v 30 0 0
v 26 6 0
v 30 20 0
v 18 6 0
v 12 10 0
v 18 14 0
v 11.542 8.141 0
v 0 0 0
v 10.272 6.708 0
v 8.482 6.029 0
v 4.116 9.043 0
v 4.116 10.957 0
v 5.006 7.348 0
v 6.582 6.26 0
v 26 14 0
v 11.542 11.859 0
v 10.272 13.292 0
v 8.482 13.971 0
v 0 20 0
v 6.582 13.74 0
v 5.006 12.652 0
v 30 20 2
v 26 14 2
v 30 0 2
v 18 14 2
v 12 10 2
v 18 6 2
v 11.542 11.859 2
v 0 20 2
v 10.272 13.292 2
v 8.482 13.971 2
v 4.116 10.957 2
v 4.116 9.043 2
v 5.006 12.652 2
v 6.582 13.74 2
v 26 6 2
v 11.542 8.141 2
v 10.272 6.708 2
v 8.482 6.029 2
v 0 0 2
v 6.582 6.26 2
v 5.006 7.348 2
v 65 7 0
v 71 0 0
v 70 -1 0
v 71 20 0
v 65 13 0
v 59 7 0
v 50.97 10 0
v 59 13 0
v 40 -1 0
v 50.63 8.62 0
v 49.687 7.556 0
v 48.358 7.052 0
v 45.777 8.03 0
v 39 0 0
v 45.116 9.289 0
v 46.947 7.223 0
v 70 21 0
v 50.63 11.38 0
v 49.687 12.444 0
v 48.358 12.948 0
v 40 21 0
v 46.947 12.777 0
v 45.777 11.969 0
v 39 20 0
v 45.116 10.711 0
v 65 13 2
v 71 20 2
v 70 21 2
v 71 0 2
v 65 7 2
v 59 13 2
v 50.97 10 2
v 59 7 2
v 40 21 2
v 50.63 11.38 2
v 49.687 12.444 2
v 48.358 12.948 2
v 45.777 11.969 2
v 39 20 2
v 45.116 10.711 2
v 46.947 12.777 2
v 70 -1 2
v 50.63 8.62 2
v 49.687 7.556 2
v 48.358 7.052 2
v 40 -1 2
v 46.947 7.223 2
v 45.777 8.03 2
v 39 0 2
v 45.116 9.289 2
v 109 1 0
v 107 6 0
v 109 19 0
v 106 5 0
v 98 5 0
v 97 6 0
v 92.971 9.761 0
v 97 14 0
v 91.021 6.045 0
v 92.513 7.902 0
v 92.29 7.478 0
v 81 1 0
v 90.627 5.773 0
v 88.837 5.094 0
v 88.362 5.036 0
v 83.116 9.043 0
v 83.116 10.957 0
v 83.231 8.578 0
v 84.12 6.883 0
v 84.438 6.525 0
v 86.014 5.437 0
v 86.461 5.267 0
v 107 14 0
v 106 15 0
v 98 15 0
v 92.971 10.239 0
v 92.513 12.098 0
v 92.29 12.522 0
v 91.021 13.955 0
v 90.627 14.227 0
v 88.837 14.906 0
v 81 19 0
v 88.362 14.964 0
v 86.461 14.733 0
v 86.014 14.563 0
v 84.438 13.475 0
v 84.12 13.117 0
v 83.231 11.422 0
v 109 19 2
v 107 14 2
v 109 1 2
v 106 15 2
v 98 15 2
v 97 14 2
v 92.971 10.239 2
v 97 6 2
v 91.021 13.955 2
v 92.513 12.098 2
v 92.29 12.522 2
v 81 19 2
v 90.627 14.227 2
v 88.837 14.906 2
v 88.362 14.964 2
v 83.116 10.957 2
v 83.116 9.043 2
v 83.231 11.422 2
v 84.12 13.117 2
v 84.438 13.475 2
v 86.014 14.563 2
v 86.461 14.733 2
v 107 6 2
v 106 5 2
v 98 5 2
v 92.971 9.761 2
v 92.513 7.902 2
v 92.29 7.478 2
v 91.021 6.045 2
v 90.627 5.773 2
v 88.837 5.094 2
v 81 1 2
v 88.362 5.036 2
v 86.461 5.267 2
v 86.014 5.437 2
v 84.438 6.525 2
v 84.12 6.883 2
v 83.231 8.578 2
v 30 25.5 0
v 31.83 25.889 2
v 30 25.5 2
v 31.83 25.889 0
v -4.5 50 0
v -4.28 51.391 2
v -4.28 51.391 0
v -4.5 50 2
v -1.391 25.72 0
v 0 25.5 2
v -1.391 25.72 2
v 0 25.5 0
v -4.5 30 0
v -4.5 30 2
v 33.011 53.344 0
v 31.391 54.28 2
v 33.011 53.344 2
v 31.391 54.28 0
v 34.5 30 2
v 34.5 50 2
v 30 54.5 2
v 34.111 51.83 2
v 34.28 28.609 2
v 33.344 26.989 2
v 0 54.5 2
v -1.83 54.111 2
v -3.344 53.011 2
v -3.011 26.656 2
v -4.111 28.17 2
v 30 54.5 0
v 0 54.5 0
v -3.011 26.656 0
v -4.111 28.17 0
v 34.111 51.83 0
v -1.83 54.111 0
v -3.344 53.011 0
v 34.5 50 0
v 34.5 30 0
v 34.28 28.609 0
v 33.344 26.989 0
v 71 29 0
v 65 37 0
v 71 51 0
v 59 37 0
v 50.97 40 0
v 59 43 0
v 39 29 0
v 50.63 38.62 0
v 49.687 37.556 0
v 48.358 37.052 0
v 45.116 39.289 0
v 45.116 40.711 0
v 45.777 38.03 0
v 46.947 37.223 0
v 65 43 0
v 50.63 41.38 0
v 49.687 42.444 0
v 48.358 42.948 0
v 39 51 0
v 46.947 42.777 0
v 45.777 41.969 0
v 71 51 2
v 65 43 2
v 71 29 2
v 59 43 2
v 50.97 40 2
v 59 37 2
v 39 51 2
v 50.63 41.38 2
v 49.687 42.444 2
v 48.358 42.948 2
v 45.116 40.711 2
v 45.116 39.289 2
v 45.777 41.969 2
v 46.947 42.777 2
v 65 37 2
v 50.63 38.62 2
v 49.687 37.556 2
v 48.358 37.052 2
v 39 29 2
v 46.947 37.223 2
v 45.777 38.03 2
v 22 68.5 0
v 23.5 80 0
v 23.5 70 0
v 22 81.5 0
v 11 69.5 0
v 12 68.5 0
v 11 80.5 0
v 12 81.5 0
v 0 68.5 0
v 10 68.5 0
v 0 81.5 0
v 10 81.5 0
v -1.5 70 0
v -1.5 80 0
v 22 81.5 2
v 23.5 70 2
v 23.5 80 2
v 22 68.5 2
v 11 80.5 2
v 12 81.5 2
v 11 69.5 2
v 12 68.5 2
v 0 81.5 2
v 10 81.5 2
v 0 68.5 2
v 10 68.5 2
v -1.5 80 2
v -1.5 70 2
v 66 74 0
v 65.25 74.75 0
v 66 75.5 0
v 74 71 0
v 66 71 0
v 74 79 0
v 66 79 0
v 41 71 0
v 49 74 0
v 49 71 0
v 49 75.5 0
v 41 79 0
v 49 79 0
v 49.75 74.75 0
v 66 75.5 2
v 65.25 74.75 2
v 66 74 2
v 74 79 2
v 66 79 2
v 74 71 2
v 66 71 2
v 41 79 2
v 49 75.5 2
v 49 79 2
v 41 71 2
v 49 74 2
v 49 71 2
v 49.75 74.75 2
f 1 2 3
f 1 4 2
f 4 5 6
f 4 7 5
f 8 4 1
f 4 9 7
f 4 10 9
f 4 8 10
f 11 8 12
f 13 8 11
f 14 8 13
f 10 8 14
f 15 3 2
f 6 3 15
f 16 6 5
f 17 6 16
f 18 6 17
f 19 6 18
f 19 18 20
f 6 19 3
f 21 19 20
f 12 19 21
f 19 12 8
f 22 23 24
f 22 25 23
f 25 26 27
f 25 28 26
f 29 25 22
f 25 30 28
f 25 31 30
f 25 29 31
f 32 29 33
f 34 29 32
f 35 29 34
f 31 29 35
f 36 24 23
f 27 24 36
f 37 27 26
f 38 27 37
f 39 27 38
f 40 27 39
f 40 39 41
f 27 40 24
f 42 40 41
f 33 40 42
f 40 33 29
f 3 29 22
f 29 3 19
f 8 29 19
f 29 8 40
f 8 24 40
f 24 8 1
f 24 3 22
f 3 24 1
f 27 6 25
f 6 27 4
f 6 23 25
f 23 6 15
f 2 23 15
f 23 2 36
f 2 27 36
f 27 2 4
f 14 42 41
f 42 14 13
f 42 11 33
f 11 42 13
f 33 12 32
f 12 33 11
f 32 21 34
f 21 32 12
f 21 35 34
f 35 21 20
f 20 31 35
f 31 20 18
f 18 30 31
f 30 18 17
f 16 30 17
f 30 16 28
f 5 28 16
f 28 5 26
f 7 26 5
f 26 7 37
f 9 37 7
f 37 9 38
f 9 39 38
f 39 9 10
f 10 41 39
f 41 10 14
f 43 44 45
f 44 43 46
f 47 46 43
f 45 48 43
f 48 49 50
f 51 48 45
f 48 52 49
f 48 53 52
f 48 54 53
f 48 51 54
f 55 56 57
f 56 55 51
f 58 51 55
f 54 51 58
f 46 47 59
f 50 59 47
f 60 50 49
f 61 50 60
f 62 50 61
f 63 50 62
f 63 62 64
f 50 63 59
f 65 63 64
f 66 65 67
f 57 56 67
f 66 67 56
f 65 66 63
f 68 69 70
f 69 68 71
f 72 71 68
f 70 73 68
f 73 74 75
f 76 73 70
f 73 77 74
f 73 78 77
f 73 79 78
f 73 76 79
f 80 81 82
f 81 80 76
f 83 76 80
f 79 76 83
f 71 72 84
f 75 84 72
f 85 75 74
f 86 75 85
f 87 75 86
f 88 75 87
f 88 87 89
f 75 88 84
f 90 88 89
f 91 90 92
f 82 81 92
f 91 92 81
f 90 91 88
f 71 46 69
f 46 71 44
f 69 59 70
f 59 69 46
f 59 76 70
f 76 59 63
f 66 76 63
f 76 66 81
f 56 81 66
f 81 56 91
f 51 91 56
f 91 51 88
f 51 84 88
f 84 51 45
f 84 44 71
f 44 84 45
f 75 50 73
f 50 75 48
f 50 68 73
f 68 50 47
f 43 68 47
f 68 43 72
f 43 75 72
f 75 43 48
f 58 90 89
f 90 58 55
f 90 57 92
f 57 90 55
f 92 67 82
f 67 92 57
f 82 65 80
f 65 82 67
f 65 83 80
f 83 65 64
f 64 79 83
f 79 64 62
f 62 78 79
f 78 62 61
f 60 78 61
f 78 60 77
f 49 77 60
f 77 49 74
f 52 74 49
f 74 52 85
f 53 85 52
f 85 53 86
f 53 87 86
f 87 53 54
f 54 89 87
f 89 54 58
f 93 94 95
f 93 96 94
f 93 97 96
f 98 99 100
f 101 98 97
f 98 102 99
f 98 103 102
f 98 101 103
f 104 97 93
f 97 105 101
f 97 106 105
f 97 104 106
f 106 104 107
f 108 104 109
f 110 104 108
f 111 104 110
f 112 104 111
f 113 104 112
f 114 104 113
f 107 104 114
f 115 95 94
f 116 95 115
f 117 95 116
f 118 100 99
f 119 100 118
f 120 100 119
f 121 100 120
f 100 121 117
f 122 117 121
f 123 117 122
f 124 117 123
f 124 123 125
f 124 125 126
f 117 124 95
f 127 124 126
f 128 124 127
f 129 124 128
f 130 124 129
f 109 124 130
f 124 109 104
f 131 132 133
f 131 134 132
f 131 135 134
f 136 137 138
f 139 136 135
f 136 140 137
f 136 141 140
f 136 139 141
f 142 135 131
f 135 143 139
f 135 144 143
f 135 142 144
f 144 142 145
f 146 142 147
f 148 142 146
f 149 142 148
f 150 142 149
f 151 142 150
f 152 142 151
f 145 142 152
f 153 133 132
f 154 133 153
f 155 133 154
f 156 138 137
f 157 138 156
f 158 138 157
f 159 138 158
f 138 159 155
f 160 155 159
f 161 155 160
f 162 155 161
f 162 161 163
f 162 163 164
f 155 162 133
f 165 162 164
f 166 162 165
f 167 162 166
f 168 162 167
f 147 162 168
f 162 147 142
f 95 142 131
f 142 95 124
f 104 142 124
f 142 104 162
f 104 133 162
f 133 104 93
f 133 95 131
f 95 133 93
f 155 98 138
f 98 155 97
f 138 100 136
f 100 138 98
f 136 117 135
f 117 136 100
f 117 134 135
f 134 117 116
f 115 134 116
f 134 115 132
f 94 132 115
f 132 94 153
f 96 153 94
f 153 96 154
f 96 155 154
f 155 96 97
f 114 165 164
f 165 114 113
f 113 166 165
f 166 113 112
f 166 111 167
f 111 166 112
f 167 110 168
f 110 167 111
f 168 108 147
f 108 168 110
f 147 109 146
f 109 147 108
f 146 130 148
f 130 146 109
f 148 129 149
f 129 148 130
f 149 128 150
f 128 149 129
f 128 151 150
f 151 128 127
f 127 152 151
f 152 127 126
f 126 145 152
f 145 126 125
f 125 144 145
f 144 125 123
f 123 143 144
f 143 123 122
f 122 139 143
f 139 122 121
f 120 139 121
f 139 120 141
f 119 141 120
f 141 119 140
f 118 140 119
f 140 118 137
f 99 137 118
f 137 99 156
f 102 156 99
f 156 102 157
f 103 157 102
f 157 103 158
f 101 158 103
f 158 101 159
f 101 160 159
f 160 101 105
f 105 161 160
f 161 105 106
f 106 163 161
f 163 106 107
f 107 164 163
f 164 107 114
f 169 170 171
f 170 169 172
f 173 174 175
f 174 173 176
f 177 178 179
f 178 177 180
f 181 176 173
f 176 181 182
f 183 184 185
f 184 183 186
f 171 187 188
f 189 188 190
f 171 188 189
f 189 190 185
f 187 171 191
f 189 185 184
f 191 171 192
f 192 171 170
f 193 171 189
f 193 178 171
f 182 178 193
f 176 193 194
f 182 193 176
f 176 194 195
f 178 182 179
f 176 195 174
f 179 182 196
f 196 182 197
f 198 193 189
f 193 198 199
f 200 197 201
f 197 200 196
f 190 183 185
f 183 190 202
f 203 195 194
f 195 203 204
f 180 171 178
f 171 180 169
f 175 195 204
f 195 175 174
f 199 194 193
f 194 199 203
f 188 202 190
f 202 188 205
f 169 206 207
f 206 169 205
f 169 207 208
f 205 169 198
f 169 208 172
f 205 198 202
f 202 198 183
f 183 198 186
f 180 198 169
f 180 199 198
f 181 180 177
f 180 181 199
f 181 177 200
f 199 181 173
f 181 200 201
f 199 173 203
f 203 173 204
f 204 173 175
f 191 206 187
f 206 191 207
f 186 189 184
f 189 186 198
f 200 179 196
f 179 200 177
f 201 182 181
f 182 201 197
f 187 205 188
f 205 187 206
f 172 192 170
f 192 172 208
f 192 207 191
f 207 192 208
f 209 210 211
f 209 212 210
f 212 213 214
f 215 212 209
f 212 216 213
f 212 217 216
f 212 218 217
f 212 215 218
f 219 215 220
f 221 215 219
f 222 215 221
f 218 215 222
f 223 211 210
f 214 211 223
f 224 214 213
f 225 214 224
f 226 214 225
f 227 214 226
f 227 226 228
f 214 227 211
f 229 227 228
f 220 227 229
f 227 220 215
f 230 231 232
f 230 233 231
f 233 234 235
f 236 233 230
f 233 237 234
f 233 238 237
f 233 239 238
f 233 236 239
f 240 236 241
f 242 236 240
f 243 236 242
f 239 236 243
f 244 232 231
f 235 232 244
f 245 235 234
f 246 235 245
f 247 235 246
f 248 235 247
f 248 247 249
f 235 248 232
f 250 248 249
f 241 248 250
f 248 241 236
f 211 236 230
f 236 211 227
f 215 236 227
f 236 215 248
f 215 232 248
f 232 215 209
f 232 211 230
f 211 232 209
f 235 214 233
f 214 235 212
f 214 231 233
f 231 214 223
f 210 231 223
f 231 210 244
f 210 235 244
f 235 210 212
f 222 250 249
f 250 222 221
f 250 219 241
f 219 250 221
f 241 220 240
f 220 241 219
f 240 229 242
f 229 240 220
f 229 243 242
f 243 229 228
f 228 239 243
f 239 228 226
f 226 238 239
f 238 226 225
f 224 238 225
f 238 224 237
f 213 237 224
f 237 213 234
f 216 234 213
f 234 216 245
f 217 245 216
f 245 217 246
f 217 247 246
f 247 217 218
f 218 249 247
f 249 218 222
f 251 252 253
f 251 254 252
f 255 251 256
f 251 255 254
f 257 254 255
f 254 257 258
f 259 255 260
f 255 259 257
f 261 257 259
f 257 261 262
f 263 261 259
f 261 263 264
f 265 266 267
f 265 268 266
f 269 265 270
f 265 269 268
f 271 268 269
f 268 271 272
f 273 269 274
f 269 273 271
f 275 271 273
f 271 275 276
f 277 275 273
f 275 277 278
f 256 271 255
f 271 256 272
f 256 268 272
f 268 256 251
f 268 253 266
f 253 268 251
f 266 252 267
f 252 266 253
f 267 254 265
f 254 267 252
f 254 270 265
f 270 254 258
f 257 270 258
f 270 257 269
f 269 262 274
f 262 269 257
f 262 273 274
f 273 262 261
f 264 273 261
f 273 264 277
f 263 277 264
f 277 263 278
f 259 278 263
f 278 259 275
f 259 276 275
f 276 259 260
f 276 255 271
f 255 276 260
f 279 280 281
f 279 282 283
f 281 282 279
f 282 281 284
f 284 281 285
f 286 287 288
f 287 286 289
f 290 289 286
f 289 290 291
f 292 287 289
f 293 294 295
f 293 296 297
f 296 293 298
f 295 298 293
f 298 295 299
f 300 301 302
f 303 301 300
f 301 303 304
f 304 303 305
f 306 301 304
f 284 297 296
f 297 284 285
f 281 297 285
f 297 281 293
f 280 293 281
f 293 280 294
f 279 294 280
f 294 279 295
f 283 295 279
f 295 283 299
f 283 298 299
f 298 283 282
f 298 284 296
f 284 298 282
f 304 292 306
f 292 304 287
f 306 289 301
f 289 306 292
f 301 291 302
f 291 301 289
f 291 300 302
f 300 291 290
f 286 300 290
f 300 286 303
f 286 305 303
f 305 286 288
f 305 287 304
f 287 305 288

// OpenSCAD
// Zweck: offset on profiles with holes – holes shrink/grow, close, thin parts vanish.
module lochplatte() difference() {
    square([30, 20]);
    translate([8, 10]) circle(r = 4);
    translate([18, 6]) square([8, 8]);
}

linear_extrude(2) lochplatte();
translate([40, 0, 0]) linear_extrude(2) offset(r = 1) lochplatte();    // Holes smaller
translate([80, 0, 0]) linear_extrude(2) offset(r = -1) lochplatte();   // Holes larger
translate([0, 30, 0]) linear_extrude(2) offset(r = 4.5) lochplatte();  // Holes closed
translate([40, 30, 0]) linear_extrude(2) offset(delta = 1) lochplatte();
// two parts grow together; a thin web vanishes inwards
translate([0, 70, 0]) linear_extrude(2) offset(r = 1.5) {
    square([10, 10]);
    translate([12, 0]) square([10, 10]);
}
translate([40, 70, 0]) linear_extrude(2) offset(r = -1) union() {
    square([10, 10]);
    translate([10, 4]) square([15, 1.5]);
    translate([25, 0]) square([10, 10]);
}
